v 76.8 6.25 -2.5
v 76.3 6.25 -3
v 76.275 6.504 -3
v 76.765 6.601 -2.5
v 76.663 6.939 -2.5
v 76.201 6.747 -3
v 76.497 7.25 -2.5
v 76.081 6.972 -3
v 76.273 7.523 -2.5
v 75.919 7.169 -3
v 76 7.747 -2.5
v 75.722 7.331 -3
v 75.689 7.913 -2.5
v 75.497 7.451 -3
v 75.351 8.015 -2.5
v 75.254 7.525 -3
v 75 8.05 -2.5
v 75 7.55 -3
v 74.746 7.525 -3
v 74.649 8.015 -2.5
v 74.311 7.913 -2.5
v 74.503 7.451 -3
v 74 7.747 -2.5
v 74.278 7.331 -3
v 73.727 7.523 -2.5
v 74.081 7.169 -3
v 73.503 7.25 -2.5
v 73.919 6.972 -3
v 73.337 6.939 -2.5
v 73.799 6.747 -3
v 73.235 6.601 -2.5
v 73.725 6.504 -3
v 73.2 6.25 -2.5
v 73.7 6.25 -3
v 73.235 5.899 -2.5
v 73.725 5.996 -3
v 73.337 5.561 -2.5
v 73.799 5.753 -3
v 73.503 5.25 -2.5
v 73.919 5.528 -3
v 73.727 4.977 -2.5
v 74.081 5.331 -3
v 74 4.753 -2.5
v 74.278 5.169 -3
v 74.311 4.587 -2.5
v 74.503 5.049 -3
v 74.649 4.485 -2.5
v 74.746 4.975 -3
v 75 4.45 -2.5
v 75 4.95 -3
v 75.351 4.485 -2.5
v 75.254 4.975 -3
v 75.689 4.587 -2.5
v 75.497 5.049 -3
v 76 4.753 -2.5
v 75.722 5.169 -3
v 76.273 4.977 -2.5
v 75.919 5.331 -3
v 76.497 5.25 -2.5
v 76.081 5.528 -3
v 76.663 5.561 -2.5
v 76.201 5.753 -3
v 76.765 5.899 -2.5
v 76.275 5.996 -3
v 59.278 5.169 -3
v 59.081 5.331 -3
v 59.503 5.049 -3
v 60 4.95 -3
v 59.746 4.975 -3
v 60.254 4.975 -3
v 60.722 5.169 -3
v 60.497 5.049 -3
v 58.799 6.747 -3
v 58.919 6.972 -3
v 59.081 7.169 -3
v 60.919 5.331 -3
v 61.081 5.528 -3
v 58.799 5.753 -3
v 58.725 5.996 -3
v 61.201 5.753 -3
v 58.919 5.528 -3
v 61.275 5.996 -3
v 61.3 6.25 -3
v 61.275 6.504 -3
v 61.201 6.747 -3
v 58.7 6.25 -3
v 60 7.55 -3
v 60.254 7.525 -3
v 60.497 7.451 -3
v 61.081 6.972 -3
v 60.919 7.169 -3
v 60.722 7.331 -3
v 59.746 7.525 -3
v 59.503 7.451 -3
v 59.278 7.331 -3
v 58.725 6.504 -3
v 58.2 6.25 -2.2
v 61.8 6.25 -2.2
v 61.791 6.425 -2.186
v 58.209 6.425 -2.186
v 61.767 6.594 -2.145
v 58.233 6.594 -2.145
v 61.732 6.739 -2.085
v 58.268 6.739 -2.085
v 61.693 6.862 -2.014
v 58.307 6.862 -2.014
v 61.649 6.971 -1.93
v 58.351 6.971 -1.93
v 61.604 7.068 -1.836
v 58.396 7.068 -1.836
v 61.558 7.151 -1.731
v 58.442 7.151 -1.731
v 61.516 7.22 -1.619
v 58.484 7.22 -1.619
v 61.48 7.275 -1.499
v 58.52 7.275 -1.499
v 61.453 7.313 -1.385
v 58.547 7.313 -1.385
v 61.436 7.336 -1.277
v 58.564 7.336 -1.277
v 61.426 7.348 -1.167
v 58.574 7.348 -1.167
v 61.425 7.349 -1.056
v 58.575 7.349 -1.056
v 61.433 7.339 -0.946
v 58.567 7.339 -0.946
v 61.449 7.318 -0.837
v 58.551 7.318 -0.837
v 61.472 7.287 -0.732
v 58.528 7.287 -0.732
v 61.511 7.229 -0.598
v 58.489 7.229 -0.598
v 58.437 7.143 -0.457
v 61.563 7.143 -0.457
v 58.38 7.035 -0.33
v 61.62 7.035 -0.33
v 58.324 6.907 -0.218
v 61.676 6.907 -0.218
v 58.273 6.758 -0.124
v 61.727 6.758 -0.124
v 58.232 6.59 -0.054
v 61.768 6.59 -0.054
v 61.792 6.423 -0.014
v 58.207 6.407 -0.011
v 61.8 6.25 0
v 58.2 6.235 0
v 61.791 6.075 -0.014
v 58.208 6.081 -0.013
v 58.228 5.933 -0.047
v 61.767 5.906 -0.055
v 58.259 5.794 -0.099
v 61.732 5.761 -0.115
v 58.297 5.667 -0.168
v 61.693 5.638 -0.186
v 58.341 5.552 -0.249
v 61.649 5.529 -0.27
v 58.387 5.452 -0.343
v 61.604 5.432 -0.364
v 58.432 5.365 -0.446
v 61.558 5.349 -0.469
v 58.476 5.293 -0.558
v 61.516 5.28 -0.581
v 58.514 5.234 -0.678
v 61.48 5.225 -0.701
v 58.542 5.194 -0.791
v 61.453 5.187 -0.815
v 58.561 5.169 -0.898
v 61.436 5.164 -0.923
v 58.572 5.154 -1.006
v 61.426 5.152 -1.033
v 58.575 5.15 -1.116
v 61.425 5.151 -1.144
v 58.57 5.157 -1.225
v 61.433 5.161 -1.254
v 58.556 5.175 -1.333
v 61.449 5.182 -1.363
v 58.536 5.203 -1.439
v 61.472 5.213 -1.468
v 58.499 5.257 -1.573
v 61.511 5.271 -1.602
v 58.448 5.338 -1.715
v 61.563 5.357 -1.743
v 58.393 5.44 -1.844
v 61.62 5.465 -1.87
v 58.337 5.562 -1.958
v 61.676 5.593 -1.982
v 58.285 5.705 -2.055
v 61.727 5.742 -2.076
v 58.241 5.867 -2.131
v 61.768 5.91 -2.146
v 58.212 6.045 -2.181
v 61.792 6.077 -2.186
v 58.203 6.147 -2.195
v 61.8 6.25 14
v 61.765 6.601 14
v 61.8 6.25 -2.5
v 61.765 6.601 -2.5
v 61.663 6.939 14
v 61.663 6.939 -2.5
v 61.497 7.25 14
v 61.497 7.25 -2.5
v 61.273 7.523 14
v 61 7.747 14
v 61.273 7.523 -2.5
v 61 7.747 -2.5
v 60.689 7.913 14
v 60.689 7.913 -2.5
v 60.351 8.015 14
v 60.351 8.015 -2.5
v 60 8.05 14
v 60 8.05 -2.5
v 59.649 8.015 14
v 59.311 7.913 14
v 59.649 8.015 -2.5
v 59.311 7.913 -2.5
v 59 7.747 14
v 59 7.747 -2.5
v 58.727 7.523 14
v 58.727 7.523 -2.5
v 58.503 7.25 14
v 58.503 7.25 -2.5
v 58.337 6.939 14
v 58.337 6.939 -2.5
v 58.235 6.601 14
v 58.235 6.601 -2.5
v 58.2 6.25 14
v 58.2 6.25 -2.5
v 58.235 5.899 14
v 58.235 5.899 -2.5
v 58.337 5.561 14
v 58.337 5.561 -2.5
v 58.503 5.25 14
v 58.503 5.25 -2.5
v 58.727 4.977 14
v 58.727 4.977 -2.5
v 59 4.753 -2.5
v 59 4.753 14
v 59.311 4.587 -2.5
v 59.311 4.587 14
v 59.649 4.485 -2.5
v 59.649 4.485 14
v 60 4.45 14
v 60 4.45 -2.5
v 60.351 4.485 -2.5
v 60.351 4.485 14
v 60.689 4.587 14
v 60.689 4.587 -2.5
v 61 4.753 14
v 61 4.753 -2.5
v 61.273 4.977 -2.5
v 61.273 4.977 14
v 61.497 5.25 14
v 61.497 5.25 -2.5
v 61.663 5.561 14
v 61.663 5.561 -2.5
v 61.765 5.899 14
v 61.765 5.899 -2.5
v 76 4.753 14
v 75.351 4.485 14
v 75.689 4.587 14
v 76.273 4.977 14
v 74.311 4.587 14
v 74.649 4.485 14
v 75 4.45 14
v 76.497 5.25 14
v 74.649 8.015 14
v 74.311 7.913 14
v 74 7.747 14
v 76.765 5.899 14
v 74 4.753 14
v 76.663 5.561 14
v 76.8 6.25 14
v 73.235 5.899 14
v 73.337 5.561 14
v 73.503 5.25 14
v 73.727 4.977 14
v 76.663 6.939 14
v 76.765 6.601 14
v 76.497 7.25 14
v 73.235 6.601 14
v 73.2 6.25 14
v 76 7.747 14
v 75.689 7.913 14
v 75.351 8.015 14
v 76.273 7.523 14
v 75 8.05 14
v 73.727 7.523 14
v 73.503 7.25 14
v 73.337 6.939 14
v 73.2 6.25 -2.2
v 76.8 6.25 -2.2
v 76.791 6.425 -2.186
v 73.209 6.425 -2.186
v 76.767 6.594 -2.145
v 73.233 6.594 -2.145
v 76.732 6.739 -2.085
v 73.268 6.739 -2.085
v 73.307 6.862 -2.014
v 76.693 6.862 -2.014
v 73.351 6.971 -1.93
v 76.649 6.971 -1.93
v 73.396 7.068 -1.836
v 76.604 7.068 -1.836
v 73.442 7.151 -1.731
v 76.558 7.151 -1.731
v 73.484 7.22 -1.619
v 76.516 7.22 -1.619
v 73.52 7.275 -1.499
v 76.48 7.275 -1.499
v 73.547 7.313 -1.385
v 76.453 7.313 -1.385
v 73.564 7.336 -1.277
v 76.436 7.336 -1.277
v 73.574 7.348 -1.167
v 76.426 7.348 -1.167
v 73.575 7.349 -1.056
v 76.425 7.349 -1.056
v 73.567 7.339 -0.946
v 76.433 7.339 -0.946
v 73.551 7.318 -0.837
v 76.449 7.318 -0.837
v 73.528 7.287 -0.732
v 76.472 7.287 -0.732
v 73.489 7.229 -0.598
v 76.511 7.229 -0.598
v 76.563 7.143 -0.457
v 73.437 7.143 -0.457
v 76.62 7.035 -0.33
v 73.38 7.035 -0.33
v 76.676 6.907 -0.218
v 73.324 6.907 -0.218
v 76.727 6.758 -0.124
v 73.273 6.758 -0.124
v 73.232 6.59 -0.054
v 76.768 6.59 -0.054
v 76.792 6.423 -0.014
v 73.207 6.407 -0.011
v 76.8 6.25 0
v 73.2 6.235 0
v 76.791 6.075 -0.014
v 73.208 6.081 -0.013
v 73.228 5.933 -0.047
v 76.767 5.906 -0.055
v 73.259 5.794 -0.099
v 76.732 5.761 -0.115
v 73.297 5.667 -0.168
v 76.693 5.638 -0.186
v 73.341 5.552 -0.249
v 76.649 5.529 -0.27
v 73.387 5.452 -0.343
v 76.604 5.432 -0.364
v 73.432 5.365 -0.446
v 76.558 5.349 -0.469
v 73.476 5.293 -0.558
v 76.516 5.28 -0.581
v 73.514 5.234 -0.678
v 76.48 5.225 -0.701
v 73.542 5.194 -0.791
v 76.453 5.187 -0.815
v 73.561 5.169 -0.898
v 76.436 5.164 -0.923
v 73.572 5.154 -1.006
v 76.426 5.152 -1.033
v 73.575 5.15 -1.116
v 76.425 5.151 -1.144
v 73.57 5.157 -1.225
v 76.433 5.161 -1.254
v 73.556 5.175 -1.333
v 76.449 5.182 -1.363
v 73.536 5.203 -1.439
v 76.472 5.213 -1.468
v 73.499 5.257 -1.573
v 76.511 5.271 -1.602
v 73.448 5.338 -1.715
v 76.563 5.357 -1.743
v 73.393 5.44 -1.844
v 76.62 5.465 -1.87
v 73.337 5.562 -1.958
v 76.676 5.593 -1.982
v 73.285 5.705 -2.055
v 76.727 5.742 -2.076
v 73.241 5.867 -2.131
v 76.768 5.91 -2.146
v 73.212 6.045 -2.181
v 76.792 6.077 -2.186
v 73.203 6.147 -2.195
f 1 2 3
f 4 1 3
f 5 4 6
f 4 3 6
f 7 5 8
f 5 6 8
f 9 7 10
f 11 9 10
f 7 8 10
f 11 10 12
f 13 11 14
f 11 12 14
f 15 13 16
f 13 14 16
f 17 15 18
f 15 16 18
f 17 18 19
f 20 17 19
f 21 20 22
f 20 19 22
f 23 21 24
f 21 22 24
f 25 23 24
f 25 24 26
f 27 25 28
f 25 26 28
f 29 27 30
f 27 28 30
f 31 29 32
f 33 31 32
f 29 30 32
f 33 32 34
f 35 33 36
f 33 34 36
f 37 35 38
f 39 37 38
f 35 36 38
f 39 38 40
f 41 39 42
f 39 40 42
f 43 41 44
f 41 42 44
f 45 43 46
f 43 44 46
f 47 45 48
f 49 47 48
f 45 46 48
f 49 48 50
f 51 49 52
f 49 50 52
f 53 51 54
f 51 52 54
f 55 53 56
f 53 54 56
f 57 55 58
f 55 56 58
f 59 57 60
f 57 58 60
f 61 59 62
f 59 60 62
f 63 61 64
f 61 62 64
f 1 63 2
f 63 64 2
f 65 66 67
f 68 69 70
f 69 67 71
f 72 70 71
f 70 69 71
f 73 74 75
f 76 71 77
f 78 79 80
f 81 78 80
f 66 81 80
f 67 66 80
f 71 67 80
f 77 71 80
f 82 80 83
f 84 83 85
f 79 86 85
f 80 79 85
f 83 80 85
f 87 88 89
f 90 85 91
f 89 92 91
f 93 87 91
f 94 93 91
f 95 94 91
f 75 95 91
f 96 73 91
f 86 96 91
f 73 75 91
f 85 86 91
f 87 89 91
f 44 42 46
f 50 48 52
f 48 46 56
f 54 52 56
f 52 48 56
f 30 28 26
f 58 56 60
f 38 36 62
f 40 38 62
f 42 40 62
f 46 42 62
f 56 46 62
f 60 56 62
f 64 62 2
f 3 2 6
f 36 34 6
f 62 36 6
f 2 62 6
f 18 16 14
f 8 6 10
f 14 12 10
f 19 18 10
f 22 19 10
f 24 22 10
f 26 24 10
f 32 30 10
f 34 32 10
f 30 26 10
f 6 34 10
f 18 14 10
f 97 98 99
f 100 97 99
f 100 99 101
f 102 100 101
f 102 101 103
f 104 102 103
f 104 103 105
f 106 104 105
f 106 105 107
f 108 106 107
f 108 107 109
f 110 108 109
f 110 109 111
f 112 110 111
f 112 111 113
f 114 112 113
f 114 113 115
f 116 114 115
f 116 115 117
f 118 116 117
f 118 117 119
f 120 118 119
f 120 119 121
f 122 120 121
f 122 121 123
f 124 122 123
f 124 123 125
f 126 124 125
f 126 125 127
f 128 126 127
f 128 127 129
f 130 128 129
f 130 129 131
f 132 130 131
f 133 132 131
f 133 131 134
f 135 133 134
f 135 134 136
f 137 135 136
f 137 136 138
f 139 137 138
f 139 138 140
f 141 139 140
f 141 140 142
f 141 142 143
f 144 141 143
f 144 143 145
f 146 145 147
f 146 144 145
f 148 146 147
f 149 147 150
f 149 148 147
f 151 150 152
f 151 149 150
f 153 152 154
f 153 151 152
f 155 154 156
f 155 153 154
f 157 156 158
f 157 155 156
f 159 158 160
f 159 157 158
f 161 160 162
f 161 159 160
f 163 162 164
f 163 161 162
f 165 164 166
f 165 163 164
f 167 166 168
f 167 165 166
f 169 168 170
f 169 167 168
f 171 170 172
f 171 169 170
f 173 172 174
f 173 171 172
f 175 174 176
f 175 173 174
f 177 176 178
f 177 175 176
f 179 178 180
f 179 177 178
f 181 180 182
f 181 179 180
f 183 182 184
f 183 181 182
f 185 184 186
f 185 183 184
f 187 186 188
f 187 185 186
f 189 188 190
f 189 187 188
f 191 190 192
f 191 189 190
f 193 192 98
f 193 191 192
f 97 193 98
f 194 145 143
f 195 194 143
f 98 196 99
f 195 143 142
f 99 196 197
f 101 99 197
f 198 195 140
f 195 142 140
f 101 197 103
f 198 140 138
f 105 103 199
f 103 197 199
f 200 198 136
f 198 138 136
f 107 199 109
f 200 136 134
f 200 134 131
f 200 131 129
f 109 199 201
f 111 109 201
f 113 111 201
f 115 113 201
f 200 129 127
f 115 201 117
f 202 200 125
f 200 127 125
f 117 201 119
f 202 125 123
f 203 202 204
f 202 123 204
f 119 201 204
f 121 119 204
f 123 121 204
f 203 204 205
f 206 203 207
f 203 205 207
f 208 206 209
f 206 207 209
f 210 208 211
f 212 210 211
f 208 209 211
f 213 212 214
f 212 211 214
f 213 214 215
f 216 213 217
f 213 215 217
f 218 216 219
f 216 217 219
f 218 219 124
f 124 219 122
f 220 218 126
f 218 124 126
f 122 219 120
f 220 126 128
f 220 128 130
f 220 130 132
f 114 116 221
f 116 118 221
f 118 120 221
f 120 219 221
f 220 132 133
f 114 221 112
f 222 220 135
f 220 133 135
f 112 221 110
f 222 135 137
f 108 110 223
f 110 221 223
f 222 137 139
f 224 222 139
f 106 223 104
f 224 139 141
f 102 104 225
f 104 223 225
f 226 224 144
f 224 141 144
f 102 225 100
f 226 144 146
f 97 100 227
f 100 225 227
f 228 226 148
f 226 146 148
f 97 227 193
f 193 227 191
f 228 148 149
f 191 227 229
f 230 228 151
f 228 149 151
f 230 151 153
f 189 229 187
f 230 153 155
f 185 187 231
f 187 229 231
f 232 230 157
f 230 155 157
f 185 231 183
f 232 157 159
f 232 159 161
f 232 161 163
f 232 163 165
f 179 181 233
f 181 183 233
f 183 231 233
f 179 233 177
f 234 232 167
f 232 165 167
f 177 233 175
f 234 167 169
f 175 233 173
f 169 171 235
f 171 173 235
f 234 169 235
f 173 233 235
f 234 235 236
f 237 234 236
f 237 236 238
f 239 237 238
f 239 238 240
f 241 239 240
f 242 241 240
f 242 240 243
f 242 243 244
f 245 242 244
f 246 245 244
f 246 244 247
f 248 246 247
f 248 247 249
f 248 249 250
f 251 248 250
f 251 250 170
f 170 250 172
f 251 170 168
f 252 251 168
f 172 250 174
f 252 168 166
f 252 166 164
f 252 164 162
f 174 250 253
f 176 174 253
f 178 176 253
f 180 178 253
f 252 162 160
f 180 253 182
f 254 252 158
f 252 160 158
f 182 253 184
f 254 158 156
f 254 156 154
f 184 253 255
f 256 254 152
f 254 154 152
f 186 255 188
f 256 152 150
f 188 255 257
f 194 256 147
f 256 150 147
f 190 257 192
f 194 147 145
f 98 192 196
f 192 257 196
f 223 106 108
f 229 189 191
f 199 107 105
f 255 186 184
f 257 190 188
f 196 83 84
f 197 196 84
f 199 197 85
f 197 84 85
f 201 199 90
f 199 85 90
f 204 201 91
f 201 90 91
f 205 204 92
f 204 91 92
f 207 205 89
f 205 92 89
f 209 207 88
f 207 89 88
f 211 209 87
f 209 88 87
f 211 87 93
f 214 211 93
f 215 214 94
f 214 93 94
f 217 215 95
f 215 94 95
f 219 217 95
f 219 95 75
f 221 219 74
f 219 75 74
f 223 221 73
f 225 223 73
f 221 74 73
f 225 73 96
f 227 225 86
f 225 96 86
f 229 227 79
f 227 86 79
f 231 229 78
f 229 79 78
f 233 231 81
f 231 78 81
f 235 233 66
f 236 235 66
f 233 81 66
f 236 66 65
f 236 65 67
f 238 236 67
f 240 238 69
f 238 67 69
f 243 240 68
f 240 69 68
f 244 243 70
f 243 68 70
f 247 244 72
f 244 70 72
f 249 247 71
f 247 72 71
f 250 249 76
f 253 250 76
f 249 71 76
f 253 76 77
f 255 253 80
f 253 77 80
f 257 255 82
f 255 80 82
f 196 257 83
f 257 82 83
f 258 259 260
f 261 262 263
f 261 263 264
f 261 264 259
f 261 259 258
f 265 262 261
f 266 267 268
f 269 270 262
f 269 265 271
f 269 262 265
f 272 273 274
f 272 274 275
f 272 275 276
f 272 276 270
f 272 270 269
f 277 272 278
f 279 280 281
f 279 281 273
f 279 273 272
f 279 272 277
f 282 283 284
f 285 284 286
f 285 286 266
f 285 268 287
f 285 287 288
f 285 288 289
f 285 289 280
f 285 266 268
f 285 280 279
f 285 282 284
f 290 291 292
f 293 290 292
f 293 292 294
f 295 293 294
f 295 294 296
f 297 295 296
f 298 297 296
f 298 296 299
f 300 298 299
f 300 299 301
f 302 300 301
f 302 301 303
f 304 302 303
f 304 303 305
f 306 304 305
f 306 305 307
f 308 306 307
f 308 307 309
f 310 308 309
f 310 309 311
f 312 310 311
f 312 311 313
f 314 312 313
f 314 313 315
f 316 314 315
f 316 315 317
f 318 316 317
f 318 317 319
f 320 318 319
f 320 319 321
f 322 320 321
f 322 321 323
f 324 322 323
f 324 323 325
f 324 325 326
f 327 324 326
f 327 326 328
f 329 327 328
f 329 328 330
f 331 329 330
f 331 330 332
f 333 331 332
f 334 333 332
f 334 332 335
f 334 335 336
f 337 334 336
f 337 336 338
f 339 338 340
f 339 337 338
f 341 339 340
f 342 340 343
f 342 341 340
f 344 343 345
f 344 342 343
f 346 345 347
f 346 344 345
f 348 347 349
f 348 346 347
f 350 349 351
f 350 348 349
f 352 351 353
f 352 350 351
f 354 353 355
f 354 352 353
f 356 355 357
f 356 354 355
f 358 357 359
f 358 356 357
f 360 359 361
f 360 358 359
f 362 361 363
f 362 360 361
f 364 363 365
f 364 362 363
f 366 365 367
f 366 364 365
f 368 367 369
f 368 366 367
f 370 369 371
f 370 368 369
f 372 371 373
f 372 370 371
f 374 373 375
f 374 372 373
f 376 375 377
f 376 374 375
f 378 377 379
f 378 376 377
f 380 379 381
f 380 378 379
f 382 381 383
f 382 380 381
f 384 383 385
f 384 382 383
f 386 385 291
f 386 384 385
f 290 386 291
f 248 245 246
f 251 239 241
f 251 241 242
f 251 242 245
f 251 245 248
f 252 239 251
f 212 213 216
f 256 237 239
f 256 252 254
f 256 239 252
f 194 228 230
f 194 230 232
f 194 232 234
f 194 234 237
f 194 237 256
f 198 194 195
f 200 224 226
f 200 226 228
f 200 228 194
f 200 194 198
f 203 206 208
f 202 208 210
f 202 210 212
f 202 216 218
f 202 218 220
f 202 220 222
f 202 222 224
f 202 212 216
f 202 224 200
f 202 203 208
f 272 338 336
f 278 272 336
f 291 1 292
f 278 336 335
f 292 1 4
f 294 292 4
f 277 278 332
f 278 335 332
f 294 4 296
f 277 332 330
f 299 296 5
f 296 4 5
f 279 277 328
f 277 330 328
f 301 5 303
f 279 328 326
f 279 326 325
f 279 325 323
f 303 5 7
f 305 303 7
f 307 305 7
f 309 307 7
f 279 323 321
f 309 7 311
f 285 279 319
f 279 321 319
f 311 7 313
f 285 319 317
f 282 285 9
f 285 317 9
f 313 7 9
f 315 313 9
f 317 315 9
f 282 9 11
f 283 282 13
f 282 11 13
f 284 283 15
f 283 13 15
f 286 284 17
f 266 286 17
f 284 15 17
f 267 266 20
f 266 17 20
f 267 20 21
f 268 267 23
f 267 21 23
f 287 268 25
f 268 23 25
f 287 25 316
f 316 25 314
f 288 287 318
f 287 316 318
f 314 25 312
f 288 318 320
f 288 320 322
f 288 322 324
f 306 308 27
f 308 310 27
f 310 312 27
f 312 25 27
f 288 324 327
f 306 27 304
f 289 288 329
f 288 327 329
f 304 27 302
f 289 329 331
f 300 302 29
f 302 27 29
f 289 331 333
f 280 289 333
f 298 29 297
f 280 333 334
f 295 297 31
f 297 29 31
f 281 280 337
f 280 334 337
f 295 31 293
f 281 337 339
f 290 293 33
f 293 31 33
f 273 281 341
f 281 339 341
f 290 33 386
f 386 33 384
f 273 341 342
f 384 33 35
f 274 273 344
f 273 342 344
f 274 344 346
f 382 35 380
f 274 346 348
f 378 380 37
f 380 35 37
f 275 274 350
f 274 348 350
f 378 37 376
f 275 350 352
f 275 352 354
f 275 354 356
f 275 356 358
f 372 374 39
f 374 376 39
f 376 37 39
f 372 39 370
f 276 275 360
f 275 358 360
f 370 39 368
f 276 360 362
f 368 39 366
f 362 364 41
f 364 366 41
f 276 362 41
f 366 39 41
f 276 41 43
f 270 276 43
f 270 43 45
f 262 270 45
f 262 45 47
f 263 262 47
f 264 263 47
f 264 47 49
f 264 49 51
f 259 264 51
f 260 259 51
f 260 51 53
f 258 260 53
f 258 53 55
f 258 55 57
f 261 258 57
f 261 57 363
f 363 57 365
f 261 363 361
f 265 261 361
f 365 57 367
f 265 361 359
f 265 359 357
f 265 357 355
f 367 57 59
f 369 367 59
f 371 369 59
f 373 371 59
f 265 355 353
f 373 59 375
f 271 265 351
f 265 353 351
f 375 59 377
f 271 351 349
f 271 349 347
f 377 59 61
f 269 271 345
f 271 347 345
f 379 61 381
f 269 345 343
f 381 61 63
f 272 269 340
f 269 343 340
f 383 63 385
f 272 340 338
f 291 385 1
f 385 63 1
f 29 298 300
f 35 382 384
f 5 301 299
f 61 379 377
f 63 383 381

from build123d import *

# Parameters (mm, degrees)
CYLINDER006_R     = 1.1
CYLINDER006_DEPTH = 25
CYLINDER004_R     = 1.8
CYLINDER004_DEPTH = 17
CYLINDER005_R     = 1.8
CYLINDER005_DEPTH = 17
CHAMFER_SIZE      = 0.5


with BuildPart() as orificiotransversalpernos:
    # Cylinder006 → Cylinder006 (new body)
    with BuildSketch(Plane(origin=(55, 6.25, -1.1), x_dir=(0, 0, -1), z_dir=(1, 0, 0))):
        Circle(CYLINDER006_R)
    extrude(amount=CYLINDER006_DEPTH)


with BuildPart() as cylinder004:
    # Cylinder004 → Cylinder004 (new body)
    with BuildSketch(Plane(origin=(75, 6.25, -3), x_dir=(1, 0, 0), z_dir=(0, 0, 1))):
        Circle(CYLINDER004_R)
    extrude(amount=CYLINDER004_DEPTH)


with BuildPart() as pernosplato:
    # Cylinder005 → Cylinder005 (new body)
    with BuildSketch(Plane(origin=(60, 6.25, -3), x_dir=(1, 0, 0), z_dir=(0, 0, 1))):
        Circle(CYLINDER005_R)
    extrude(amount=CYLINDER005_DEPTH)

    # Compound001: union Cylinder004
    add(cylinder004.part)

    # Chamfer
    chamfer_edges = [pernosplato.edges().sort_by_distance(p)[0] for p in [
        (58.2, 6.25, -3),
        (73.2, 6.25, -3),
    ]]
    chamfer(chamfer_edges, length=CHAMFER_SIZE)

    # Cut001: cut OrificioTransversalPernos
    add(orificiotransversalpernos.part, mode=Mode.SUBTRACT)


solid = pernosplato.part
